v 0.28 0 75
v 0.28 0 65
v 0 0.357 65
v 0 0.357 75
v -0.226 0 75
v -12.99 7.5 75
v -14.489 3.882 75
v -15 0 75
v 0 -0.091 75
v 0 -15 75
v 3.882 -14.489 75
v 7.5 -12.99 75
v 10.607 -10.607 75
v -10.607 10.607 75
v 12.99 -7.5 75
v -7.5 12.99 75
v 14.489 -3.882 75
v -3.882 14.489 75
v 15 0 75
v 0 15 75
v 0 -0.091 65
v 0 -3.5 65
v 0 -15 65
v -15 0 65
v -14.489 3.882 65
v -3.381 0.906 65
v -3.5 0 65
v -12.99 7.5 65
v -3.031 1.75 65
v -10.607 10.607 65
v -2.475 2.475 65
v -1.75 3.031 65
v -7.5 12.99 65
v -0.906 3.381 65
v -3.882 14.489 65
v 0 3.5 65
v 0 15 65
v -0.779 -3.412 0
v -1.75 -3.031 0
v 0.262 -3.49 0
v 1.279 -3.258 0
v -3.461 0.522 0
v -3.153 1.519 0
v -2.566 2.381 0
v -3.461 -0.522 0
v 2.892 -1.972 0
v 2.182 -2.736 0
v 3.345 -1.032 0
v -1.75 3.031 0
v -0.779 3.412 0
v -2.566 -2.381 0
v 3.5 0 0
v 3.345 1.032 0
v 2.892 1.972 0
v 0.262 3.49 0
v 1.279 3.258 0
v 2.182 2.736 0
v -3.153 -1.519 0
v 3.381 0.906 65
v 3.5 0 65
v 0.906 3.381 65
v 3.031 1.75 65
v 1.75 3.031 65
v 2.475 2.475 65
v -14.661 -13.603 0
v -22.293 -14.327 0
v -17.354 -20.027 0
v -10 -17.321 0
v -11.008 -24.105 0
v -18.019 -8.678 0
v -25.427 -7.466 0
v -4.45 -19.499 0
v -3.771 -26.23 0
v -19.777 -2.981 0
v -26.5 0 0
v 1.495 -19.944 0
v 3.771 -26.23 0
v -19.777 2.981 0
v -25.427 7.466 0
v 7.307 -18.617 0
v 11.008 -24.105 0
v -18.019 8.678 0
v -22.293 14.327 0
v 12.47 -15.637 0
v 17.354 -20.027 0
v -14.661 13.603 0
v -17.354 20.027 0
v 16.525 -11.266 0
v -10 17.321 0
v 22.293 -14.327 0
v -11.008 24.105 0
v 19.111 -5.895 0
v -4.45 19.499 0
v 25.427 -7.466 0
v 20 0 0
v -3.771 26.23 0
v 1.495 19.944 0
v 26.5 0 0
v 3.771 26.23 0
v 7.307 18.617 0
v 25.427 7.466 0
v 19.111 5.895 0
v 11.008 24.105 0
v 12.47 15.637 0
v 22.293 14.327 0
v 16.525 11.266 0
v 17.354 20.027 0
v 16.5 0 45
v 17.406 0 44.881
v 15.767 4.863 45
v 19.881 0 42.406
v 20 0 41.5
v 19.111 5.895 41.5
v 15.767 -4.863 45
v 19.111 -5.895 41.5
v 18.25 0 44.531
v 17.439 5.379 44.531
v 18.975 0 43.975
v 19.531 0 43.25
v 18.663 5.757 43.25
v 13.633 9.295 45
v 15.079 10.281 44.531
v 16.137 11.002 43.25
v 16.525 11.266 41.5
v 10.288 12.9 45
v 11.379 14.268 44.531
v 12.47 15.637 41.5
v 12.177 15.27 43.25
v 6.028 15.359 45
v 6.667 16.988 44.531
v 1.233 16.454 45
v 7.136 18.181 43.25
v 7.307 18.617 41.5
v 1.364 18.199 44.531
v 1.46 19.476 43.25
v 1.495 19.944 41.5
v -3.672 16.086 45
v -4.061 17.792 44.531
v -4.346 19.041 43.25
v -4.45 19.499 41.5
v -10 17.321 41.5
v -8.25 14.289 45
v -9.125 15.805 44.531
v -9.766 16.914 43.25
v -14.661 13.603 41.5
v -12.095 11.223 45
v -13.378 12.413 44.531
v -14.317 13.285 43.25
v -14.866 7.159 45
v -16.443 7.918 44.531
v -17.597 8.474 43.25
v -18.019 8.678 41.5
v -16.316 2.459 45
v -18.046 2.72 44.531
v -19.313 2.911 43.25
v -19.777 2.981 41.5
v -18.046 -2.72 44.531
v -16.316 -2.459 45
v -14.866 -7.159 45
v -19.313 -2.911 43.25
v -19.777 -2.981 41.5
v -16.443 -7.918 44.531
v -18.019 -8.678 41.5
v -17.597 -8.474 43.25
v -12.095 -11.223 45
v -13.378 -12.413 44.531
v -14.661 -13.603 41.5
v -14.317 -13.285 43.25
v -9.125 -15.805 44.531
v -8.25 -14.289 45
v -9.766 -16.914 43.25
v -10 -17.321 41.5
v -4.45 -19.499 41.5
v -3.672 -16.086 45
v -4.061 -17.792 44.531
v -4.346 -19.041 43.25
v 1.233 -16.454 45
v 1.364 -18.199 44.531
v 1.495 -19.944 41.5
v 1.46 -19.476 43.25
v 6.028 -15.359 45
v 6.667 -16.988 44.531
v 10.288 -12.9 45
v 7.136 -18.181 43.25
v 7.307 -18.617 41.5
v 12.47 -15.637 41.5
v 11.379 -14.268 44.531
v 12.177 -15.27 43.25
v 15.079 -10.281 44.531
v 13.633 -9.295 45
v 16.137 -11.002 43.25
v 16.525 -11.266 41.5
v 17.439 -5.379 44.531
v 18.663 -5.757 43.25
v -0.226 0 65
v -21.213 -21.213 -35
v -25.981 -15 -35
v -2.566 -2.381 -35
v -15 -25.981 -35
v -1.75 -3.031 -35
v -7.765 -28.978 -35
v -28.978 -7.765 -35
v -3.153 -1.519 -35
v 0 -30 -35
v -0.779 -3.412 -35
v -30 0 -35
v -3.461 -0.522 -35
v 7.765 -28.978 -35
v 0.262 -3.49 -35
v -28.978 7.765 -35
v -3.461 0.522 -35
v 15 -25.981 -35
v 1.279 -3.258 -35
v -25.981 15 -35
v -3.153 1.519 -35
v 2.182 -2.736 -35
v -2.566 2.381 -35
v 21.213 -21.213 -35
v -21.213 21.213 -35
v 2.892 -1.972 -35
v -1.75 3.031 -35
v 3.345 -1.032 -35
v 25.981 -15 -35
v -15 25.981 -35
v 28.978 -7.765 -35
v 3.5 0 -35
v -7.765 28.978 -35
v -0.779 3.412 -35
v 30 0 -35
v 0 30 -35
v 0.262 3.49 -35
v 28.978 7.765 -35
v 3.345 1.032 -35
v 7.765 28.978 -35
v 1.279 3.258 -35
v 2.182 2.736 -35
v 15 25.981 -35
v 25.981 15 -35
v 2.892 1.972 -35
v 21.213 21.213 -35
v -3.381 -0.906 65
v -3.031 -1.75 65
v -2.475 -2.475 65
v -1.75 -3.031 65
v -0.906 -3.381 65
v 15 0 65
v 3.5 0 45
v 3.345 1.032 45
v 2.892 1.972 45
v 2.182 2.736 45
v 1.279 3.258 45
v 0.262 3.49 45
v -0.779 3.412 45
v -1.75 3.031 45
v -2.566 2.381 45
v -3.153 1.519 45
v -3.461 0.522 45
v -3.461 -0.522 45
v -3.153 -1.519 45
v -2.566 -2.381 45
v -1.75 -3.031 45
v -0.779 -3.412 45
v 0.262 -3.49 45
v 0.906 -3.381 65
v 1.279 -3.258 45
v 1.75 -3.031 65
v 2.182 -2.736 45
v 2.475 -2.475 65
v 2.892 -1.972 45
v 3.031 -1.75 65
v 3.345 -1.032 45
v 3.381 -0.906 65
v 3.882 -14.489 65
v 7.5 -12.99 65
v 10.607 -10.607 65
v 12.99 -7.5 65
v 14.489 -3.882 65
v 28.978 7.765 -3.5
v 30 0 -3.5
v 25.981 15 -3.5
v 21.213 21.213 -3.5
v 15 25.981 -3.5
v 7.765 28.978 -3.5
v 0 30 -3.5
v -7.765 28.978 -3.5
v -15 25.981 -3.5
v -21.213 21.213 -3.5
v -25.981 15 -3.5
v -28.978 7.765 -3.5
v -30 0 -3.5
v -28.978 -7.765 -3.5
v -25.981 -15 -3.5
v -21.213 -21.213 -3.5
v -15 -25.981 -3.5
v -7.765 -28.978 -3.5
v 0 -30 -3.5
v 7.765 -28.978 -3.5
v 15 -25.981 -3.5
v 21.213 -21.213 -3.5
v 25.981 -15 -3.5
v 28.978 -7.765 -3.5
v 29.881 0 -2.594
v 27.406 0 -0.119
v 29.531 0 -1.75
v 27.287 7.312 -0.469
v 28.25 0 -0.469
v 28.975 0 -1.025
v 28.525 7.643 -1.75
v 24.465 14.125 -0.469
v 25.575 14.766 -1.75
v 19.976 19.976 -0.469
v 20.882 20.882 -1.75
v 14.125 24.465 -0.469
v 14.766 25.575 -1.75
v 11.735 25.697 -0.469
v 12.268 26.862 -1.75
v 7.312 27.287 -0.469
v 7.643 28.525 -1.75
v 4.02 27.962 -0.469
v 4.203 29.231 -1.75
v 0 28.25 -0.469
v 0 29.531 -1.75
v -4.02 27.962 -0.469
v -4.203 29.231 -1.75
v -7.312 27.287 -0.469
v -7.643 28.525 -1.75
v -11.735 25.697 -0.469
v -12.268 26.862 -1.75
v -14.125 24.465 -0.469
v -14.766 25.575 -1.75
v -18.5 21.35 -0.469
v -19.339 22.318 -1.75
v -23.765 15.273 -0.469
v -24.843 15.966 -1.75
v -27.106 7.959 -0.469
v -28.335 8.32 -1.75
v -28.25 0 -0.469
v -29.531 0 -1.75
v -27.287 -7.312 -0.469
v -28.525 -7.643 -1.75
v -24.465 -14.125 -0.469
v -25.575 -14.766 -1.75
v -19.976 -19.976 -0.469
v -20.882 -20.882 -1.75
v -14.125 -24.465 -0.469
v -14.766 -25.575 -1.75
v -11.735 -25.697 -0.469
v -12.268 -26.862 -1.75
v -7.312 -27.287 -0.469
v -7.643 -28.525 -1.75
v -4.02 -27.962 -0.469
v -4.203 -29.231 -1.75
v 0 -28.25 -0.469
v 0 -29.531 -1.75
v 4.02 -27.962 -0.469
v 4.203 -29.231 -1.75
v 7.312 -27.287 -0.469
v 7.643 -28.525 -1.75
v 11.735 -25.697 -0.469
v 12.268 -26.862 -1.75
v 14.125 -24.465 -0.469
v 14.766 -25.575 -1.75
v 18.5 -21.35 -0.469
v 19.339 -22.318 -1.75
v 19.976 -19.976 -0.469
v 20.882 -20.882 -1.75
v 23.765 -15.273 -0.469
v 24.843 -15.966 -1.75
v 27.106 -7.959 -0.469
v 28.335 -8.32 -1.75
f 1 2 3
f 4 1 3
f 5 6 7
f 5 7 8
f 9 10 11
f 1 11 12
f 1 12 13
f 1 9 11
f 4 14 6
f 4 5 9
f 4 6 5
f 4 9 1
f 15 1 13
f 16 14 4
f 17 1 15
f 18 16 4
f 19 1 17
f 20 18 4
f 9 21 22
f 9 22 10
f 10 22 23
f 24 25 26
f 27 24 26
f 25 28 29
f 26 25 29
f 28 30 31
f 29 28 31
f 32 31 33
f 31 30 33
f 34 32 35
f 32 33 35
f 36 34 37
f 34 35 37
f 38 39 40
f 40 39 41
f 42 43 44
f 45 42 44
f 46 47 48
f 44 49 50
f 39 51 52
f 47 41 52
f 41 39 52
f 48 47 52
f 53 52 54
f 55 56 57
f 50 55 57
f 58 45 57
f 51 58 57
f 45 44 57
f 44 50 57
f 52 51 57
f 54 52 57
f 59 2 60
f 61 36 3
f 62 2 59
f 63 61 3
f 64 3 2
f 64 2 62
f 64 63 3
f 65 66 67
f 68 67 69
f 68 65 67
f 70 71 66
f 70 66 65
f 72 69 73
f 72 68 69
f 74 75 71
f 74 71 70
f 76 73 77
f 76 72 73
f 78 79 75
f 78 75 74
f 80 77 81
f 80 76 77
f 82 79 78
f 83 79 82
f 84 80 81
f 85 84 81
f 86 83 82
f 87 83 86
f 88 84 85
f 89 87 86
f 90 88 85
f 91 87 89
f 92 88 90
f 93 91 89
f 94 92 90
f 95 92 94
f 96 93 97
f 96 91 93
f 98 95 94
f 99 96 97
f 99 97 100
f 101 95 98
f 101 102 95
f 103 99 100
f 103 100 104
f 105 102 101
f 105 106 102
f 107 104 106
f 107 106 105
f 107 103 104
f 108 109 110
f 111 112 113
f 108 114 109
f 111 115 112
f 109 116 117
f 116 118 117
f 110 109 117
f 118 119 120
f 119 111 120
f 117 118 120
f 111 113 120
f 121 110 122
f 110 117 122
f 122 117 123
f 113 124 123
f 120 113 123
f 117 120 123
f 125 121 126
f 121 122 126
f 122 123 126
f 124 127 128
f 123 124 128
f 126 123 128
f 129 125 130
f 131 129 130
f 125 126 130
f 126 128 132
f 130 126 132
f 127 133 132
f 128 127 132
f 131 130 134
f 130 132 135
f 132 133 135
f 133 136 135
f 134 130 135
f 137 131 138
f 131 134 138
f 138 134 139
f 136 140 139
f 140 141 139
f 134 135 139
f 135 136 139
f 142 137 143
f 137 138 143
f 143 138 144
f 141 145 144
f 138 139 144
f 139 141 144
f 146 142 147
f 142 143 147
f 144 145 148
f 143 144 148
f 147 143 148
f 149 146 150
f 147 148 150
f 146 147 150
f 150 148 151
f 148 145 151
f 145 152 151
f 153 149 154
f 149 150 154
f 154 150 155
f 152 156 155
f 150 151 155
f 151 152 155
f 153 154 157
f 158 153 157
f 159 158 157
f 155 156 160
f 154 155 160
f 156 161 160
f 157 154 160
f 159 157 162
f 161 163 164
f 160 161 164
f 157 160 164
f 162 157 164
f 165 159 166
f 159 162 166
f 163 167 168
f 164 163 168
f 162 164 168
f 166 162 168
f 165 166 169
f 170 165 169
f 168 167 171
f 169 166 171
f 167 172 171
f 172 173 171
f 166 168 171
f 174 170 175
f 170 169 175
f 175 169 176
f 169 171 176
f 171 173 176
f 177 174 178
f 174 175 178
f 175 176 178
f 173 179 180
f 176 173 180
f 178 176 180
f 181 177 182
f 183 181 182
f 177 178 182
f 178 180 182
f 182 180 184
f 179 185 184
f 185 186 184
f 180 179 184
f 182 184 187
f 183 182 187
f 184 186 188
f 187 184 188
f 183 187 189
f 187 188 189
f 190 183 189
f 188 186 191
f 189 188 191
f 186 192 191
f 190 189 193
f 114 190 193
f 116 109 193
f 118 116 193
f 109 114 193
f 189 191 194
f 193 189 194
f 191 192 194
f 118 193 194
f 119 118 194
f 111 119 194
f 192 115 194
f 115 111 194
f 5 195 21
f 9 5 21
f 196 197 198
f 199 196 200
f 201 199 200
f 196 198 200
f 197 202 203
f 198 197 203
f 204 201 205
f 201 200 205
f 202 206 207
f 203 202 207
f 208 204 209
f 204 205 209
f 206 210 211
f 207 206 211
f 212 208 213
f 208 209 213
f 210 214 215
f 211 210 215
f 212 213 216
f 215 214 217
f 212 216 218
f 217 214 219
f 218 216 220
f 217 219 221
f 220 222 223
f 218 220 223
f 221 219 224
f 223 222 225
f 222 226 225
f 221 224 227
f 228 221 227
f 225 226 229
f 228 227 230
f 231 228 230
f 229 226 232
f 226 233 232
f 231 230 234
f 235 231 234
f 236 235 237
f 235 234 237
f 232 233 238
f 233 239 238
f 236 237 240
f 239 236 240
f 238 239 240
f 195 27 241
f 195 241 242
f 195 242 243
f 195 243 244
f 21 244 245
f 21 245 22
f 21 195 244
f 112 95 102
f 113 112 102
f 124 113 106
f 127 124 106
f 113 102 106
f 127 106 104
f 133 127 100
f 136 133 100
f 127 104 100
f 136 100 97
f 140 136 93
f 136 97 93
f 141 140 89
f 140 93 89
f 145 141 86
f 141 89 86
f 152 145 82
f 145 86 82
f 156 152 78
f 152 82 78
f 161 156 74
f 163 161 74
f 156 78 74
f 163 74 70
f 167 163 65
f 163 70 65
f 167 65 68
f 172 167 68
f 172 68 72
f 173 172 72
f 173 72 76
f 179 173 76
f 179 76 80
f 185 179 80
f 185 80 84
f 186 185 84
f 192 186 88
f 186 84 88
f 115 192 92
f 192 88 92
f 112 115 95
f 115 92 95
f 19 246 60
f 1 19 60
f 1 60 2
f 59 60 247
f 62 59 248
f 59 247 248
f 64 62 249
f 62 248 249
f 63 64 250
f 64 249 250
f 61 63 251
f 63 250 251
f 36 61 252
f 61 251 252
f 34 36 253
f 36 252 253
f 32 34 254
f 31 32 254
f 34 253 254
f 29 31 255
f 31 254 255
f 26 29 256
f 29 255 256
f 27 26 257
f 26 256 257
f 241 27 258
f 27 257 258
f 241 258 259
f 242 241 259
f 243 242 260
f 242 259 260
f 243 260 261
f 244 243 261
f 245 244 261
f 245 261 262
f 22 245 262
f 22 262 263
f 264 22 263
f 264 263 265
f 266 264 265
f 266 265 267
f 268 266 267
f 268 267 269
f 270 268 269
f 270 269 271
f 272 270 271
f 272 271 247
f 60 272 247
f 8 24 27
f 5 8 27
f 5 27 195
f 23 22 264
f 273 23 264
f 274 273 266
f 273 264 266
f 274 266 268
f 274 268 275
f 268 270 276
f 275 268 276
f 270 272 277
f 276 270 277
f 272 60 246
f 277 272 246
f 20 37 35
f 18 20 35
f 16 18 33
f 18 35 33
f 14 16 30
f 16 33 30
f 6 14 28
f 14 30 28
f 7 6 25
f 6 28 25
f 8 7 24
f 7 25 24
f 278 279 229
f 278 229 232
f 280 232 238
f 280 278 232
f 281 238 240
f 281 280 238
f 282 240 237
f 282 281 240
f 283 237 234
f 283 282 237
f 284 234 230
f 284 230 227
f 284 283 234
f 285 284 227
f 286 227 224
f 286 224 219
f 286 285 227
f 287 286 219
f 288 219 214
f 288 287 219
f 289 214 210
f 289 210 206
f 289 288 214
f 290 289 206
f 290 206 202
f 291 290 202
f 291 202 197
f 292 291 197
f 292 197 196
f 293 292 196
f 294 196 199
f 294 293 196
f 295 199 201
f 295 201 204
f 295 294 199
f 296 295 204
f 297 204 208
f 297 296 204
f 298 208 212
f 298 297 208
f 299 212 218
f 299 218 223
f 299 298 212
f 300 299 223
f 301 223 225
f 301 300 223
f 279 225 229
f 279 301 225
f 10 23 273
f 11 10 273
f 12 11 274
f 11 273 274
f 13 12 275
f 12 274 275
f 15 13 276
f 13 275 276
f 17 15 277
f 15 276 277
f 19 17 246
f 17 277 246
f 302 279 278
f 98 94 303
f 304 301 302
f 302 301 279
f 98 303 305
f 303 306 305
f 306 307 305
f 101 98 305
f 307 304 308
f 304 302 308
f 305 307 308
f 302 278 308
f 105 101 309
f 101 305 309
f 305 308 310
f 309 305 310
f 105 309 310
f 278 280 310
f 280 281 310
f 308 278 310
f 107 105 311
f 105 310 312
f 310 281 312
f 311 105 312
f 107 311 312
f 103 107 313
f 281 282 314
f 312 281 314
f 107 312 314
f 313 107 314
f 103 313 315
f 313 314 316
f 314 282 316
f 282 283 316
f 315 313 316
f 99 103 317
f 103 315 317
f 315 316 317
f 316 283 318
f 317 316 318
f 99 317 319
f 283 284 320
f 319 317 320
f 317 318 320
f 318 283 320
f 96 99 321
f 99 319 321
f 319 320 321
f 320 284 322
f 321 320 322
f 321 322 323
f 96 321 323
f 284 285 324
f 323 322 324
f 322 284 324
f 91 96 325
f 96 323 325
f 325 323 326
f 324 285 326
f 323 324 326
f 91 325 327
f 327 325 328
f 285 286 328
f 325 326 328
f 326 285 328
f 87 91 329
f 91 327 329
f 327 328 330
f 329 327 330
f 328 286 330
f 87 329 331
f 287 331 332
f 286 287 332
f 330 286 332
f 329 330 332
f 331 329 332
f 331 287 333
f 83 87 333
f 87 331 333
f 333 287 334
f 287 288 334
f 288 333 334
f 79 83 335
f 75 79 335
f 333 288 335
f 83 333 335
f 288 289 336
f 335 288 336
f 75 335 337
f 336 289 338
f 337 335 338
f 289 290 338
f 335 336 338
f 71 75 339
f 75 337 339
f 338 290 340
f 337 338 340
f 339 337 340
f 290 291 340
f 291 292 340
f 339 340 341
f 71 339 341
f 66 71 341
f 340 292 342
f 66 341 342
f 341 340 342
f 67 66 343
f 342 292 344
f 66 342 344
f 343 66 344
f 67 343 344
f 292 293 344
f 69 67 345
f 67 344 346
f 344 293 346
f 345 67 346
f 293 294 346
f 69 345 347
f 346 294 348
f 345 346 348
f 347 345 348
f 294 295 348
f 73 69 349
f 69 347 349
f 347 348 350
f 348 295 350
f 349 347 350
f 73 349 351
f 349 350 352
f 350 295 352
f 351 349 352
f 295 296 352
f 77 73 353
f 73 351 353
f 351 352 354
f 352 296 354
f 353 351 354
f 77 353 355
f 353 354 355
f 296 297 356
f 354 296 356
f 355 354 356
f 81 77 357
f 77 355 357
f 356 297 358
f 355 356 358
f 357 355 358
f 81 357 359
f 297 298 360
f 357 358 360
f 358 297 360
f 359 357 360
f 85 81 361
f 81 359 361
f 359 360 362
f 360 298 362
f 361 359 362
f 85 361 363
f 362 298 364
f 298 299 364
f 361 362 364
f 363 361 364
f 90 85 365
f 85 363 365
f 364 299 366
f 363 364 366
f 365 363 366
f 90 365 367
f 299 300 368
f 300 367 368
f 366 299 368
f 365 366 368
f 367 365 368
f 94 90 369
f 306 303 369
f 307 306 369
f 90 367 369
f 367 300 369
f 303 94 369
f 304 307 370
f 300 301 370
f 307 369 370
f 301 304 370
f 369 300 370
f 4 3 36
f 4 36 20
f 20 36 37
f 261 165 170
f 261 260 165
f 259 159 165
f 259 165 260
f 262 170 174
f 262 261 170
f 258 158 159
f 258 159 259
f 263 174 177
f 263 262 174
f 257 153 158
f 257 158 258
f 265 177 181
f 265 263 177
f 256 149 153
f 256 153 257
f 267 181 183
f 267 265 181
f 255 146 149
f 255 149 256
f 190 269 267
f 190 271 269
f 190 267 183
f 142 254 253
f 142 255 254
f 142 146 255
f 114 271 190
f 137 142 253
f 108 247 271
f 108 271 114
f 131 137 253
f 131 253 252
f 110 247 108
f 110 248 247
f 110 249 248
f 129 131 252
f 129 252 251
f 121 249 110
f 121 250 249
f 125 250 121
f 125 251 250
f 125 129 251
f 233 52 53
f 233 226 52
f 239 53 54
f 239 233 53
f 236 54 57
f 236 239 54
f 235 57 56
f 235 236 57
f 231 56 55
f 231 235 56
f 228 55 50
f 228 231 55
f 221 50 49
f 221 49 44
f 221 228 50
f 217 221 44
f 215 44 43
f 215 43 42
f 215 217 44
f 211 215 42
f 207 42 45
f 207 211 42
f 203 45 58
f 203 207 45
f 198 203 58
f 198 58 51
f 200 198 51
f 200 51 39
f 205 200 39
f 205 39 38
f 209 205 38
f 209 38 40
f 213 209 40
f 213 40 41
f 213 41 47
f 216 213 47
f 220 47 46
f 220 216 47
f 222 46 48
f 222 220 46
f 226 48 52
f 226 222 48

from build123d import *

# Parameters (mm, degrees)
F0_R     = 30
F0_R_2   = 20
F0_R_3   = 3.5
F1_DEPTH = 35
F2_DEPTH = 45
F3_DEPTH = 65
F6_DEPTH = 10
F7_R     = 3.5


with BuildPart() as f1:
    # F0 (on Top) → F1 (new body)
    with BuildSketch(Plane.XY):
        Circle(F0_R)
        Circle(F0_R_2, mode=Mode.SUBTRACT)
        Circle(F0_R_2)
        Circle(F0_R_3, mode=Mode.SUBTRACT)
    extrude(amount=-F1_DEPTH)

    # F0 (on Top) → F2 (join)
    with BuildSketch(Plane.XY):
        Circle(F0_R_2)
        Circle(F0_R_3, mode=Mode.SUBTRACT)
    extrude(amount=F2_DEPTH)

    # F0 (on Top) → F3 (join)
    with BuildSketch(Plane.XY):
        Circle(F0_R_3)
    extrude(amount=F3_DEPTH)

    # F5 (on offset) → F6 (join)
    with BuildSketch(Plane.XY.offset(65)):
        with BuildLine():
            Line((0, 3.582485), (0, 15))
            ThreePointArc((0, 15), (-10.606602, 10.606602), (-15, 0))
            Line((-15, 0), (-1.836112, 0))
            Line((-1.836112, 0), (-0.225955, 0))
            Line((-0.225955, 0), (0, -0.090901))
            Line((0, -0.090901), (0, -1.836112))
            Line((0, -1.836112), (0, -15))
            ThreePointArc((0, -15), (10.606602, -10.606602), (15, 0))
            Line((15, 0), (1.836112, 0))
            Line((1.836112, 0), (0.280118, 0))
            Line((0.280118, 0), (0, 0.357013))
            Line((0, 0.357013), (0, 3.582485))
        make_face()
    extrude(amount=F6_DEPTH)

    # F7
    f7_edges = [f1.edges().sort_by_distance(p)[0] for p in [
        (-20, 0, 45),
        (-30, 0, 0),
    ]]
    fillet(f7_edges, radius=F7_R)


solid = f1.part
